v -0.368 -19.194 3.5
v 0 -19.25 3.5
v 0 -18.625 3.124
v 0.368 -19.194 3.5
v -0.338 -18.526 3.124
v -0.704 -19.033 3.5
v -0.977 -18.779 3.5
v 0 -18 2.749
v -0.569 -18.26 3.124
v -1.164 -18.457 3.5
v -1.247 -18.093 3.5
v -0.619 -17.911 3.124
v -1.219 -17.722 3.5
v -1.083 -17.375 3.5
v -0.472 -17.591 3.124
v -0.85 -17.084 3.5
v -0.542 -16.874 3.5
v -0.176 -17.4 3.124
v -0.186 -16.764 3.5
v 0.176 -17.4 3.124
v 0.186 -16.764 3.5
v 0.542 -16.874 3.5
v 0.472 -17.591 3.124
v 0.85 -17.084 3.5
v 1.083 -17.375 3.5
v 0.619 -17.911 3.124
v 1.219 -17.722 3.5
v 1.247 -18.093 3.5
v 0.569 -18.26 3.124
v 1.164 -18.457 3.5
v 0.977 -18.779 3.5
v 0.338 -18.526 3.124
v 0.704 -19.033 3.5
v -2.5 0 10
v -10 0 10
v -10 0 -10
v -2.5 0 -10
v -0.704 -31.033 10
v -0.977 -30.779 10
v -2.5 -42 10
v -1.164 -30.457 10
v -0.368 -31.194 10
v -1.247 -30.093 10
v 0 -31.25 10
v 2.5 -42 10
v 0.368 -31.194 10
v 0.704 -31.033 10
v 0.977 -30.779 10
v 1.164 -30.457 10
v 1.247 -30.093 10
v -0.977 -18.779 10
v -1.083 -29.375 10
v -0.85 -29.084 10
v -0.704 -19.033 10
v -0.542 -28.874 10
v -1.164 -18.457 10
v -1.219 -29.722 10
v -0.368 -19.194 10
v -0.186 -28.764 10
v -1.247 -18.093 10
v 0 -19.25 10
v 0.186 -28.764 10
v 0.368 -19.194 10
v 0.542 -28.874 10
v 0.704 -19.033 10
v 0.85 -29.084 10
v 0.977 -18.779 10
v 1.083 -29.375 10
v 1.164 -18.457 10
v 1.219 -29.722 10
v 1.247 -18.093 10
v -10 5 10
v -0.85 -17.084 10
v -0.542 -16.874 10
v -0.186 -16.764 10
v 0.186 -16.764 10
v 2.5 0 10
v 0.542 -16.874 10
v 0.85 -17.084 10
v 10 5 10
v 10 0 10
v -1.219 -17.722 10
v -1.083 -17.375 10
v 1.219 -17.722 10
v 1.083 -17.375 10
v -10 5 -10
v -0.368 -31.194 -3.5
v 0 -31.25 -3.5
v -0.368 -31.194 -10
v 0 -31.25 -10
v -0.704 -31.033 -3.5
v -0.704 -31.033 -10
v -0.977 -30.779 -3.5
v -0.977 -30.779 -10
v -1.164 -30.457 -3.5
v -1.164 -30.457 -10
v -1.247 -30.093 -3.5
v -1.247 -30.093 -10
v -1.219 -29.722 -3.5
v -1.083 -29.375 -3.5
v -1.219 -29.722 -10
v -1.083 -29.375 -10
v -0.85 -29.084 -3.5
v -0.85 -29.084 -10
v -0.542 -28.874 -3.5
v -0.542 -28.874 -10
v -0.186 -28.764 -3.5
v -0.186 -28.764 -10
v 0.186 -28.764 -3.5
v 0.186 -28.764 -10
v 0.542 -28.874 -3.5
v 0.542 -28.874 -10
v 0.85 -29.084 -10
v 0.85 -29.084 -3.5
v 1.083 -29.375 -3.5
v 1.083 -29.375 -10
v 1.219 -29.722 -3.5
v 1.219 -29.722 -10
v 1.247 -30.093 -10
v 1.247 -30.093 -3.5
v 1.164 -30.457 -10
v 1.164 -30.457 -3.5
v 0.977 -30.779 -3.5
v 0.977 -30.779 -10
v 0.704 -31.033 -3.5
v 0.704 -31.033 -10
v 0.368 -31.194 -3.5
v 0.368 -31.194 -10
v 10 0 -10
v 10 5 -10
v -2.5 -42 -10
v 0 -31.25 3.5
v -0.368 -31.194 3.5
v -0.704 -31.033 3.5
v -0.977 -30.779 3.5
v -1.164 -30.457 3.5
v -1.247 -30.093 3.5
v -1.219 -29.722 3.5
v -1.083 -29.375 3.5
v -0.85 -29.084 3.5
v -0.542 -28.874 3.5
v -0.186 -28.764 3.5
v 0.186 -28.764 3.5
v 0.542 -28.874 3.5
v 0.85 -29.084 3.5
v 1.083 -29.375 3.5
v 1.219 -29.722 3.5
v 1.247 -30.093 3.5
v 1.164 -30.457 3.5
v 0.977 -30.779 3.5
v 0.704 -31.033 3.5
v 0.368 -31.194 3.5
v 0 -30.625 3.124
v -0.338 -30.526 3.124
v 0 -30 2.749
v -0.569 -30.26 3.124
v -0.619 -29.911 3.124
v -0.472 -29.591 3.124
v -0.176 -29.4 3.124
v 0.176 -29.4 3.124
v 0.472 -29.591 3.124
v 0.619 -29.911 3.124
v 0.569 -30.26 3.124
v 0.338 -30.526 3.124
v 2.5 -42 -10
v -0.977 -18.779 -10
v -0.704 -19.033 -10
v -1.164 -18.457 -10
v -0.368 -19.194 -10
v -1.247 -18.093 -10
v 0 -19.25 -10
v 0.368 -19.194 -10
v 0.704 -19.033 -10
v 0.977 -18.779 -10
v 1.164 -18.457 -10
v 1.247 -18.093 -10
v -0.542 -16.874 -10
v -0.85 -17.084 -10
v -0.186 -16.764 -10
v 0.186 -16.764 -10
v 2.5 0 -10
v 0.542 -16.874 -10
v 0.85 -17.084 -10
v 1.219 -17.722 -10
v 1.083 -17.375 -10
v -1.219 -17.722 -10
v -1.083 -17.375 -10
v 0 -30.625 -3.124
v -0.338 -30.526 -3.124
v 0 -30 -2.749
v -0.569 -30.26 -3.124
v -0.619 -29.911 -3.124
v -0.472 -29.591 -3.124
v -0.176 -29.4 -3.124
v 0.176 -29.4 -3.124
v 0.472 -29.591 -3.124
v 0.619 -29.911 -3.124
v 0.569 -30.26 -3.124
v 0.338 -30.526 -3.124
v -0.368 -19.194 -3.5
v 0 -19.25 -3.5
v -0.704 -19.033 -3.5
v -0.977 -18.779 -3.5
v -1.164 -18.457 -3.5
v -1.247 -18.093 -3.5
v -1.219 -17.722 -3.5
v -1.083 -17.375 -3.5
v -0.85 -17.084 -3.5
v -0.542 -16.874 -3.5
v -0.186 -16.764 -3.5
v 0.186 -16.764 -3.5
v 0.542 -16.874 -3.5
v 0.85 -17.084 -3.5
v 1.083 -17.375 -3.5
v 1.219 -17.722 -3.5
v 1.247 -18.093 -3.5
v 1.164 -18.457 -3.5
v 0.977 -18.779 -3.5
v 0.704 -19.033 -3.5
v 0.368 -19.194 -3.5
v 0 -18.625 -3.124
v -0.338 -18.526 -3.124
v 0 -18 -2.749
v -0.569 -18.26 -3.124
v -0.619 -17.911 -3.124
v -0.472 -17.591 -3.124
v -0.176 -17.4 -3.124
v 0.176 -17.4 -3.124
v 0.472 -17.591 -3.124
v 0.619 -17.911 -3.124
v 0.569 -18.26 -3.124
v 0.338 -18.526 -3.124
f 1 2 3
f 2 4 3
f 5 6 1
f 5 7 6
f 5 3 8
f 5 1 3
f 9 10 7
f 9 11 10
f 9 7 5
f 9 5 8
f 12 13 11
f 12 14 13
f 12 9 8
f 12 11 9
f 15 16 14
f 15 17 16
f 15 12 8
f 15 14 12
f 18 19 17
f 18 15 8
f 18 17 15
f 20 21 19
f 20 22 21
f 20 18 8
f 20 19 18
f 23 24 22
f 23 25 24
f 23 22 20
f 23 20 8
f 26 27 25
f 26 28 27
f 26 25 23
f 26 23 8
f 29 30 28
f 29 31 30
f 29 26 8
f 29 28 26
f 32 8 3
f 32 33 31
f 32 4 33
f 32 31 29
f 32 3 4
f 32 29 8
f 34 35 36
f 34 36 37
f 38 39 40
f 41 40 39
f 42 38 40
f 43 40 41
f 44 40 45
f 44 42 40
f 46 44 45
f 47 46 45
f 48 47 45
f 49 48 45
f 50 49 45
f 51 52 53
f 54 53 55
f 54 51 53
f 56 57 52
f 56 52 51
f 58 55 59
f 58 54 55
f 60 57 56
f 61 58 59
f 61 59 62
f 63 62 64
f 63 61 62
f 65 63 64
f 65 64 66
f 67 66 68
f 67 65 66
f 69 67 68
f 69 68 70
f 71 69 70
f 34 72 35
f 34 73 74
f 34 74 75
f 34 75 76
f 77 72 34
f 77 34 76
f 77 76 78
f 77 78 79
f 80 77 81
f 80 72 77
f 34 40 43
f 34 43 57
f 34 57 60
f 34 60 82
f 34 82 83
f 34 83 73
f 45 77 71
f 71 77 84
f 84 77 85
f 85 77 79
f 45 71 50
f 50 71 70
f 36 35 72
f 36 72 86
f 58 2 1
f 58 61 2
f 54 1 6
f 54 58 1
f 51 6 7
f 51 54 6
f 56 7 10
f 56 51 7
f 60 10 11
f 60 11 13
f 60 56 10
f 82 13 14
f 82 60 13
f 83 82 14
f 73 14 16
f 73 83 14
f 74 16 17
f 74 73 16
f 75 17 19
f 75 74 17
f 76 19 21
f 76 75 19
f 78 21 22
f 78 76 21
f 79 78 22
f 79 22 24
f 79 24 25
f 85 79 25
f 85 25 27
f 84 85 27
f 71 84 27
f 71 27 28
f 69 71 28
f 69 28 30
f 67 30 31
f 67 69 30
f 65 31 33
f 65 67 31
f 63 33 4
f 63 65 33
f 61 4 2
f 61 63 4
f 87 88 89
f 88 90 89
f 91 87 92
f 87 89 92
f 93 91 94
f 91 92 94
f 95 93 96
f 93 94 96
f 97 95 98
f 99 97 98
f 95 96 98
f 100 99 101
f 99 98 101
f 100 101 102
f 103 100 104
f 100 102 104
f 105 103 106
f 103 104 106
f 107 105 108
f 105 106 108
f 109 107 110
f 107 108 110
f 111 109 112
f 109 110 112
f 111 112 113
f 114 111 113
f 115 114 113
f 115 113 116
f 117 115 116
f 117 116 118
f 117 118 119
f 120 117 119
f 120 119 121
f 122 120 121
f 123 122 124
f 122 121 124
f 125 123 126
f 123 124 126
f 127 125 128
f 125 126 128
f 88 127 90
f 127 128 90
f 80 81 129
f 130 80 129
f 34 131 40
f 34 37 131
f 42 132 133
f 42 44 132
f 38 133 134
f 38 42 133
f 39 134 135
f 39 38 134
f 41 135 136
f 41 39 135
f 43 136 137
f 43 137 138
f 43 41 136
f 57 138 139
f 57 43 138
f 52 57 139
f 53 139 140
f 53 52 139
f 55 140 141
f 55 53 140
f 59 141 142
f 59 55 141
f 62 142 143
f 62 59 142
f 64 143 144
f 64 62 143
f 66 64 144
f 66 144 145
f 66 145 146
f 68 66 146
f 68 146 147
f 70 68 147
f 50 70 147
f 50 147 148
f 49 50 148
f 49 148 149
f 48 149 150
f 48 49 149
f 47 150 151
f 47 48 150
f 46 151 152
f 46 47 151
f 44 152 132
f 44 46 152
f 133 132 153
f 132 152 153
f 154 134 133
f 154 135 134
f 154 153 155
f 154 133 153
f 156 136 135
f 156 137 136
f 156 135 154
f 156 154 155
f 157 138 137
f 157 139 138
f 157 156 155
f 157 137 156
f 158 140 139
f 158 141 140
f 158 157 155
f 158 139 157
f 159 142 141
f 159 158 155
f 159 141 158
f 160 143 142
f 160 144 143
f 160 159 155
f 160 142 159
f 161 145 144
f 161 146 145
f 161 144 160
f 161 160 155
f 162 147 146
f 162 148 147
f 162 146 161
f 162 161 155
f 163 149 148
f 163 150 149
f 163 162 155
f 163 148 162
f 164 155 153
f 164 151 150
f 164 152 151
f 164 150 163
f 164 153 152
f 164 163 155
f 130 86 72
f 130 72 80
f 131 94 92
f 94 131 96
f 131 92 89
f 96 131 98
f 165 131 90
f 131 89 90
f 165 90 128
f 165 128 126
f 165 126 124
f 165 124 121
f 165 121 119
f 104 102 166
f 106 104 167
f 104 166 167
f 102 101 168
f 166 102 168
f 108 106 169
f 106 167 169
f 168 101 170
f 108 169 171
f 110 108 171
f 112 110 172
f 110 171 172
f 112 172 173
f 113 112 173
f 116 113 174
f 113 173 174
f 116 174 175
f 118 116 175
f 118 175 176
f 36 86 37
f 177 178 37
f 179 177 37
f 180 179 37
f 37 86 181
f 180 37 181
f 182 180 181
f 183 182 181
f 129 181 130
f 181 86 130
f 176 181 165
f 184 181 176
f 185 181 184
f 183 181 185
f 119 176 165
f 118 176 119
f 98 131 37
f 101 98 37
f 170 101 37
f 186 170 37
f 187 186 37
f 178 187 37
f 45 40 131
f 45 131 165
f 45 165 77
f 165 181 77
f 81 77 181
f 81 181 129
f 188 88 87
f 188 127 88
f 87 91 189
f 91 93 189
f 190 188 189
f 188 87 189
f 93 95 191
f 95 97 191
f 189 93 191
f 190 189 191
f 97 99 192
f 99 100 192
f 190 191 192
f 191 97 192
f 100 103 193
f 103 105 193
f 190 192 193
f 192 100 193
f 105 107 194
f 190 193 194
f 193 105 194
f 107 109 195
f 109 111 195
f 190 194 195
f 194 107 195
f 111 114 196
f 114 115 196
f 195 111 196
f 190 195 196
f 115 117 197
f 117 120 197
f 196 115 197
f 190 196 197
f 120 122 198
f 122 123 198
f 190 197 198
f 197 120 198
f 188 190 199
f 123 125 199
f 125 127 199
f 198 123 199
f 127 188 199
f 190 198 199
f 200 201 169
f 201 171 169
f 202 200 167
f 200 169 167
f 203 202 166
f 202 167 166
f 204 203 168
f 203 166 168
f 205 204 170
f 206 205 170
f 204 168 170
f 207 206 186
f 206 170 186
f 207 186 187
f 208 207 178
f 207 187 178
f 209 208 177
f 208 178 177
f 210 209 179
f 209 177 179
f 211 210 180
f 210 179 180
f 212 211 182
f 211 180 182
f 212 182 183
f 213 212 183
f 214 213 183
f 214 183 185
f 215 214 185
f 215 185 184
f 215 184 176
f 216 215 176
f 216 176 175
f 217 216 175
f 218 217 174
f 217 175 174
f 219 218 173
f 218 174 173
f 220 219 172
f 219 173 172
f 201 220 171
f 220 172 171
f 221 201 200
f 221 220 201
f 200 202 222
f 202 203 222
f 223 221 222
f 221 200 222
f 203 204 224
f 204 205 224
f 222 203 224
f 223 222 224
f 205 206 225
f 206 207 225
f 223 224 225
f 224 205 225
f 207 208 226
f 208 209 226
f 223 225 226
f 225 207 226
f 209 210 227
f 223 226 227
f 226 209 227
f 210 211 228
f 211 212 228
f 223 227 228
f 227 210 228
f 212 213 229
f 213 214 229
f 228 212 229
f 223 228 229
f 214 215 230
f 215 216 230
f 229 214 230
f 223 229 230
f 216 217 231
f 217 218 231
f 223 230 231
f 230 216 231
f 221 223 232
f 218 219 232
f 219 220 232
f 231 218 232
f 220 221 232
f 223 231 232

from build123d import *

# Parameters (mm, degrees)
SKETCH_1_W                  = 20
SKETCH_1_H                  = 20
EXTRUDE_1_DEPTH             = 5
SKETCH_2_W                  = 5
SKETCH_2_H                  = 20
EXTRUDE_2_DEPTH             = 35
HOLE_WIZARD_M3_1_AT_2_COUNT = 2
HOLE_WIZARD_M3_1_AT_2_PITCH = 12
SKETCH_5_W                  = 5
SKETCH_5_H                  = 20
EXTRUDE_3_DEPTH             = 7


with BuildPart() as part:
    # 草圖1 → 填料-伸長1 (new body)
    with BuildSketch(Plane(origin=(0, 0, 0), x_dir=(1, 0, 0), z_dir=(0, 1, 0))):
        Rectangle(SKETCH_1_W, SKETCH_1_H)
    extrude(amount=EXTRUDE_1_DEPTH)

    # 草圖2 → 填料-伸長2 (add)
    with BuildSketch(Plane.XZ):
        Rectangle(SKETCH_2_W, SKETCH_2_H)
    extrude(amount=EXTRUDE_2_DEPTH)

    # 草圖4 → M3 螺紋孔1 (revolve, cut)
    with BuildSketch(Plane(origin=(0, -18, 10), x_dir=(0, -1, 0), z_dir=(1, 0, 0))):
        Polygon((0, 0), (0, 7.251075774), (1.25, 6.5), (1.25, 0), align=None)
    hole_wizard_m3_1 = revolve(axis=Axis((0, -18, 16.35), (0, 0, -1)), mode=Mode.SUBTRACT)

    # M3 螺紋孔1 at 2: M3 螺紋孔1 ×2
    with Locations(*[(0, -i * HOLE_WIZARD_M3_1_AT_2_PITCH, 0) for i in range(1, HOLE_WIZARD_M3_1_AT_2_COUNT)]):
        add(hole_wizard_m3_1, mode=Mode.SUBTRACT)

    # 鏡射1: M3 螺紋孔1 across plane
    add(hole_wizard_m3_1.mirror(Plane.XY), mode=Mode.SUBTRACT)

    # 鏡射1 copy 1 sketch → 鏡射1 copy 1 (revolve, cut)
    with BuildSketch(Plane(origin=(0, -30, -10), x_dir=(0, -1, 0), z_dir=(1, 0, 0))):
        Polygon((0, 0), (0, -7.251075774), (1.25, -6.5), (1.25, 0), align=None)
    revolve(axis=Axis((0, -30, -16.35), (0, 0, -1)), mode=Mode.SUBTRACT)

    # 草圖5 → 填料-伸長3 (add)
    with BuildSketch(Plane.XZ.offset(35)):
        Rectangle(SKETCH_5_W, SKETCH_5_H)
    extrude(amount=EXTRUDE_3_DEPTH)


solid = part.part
